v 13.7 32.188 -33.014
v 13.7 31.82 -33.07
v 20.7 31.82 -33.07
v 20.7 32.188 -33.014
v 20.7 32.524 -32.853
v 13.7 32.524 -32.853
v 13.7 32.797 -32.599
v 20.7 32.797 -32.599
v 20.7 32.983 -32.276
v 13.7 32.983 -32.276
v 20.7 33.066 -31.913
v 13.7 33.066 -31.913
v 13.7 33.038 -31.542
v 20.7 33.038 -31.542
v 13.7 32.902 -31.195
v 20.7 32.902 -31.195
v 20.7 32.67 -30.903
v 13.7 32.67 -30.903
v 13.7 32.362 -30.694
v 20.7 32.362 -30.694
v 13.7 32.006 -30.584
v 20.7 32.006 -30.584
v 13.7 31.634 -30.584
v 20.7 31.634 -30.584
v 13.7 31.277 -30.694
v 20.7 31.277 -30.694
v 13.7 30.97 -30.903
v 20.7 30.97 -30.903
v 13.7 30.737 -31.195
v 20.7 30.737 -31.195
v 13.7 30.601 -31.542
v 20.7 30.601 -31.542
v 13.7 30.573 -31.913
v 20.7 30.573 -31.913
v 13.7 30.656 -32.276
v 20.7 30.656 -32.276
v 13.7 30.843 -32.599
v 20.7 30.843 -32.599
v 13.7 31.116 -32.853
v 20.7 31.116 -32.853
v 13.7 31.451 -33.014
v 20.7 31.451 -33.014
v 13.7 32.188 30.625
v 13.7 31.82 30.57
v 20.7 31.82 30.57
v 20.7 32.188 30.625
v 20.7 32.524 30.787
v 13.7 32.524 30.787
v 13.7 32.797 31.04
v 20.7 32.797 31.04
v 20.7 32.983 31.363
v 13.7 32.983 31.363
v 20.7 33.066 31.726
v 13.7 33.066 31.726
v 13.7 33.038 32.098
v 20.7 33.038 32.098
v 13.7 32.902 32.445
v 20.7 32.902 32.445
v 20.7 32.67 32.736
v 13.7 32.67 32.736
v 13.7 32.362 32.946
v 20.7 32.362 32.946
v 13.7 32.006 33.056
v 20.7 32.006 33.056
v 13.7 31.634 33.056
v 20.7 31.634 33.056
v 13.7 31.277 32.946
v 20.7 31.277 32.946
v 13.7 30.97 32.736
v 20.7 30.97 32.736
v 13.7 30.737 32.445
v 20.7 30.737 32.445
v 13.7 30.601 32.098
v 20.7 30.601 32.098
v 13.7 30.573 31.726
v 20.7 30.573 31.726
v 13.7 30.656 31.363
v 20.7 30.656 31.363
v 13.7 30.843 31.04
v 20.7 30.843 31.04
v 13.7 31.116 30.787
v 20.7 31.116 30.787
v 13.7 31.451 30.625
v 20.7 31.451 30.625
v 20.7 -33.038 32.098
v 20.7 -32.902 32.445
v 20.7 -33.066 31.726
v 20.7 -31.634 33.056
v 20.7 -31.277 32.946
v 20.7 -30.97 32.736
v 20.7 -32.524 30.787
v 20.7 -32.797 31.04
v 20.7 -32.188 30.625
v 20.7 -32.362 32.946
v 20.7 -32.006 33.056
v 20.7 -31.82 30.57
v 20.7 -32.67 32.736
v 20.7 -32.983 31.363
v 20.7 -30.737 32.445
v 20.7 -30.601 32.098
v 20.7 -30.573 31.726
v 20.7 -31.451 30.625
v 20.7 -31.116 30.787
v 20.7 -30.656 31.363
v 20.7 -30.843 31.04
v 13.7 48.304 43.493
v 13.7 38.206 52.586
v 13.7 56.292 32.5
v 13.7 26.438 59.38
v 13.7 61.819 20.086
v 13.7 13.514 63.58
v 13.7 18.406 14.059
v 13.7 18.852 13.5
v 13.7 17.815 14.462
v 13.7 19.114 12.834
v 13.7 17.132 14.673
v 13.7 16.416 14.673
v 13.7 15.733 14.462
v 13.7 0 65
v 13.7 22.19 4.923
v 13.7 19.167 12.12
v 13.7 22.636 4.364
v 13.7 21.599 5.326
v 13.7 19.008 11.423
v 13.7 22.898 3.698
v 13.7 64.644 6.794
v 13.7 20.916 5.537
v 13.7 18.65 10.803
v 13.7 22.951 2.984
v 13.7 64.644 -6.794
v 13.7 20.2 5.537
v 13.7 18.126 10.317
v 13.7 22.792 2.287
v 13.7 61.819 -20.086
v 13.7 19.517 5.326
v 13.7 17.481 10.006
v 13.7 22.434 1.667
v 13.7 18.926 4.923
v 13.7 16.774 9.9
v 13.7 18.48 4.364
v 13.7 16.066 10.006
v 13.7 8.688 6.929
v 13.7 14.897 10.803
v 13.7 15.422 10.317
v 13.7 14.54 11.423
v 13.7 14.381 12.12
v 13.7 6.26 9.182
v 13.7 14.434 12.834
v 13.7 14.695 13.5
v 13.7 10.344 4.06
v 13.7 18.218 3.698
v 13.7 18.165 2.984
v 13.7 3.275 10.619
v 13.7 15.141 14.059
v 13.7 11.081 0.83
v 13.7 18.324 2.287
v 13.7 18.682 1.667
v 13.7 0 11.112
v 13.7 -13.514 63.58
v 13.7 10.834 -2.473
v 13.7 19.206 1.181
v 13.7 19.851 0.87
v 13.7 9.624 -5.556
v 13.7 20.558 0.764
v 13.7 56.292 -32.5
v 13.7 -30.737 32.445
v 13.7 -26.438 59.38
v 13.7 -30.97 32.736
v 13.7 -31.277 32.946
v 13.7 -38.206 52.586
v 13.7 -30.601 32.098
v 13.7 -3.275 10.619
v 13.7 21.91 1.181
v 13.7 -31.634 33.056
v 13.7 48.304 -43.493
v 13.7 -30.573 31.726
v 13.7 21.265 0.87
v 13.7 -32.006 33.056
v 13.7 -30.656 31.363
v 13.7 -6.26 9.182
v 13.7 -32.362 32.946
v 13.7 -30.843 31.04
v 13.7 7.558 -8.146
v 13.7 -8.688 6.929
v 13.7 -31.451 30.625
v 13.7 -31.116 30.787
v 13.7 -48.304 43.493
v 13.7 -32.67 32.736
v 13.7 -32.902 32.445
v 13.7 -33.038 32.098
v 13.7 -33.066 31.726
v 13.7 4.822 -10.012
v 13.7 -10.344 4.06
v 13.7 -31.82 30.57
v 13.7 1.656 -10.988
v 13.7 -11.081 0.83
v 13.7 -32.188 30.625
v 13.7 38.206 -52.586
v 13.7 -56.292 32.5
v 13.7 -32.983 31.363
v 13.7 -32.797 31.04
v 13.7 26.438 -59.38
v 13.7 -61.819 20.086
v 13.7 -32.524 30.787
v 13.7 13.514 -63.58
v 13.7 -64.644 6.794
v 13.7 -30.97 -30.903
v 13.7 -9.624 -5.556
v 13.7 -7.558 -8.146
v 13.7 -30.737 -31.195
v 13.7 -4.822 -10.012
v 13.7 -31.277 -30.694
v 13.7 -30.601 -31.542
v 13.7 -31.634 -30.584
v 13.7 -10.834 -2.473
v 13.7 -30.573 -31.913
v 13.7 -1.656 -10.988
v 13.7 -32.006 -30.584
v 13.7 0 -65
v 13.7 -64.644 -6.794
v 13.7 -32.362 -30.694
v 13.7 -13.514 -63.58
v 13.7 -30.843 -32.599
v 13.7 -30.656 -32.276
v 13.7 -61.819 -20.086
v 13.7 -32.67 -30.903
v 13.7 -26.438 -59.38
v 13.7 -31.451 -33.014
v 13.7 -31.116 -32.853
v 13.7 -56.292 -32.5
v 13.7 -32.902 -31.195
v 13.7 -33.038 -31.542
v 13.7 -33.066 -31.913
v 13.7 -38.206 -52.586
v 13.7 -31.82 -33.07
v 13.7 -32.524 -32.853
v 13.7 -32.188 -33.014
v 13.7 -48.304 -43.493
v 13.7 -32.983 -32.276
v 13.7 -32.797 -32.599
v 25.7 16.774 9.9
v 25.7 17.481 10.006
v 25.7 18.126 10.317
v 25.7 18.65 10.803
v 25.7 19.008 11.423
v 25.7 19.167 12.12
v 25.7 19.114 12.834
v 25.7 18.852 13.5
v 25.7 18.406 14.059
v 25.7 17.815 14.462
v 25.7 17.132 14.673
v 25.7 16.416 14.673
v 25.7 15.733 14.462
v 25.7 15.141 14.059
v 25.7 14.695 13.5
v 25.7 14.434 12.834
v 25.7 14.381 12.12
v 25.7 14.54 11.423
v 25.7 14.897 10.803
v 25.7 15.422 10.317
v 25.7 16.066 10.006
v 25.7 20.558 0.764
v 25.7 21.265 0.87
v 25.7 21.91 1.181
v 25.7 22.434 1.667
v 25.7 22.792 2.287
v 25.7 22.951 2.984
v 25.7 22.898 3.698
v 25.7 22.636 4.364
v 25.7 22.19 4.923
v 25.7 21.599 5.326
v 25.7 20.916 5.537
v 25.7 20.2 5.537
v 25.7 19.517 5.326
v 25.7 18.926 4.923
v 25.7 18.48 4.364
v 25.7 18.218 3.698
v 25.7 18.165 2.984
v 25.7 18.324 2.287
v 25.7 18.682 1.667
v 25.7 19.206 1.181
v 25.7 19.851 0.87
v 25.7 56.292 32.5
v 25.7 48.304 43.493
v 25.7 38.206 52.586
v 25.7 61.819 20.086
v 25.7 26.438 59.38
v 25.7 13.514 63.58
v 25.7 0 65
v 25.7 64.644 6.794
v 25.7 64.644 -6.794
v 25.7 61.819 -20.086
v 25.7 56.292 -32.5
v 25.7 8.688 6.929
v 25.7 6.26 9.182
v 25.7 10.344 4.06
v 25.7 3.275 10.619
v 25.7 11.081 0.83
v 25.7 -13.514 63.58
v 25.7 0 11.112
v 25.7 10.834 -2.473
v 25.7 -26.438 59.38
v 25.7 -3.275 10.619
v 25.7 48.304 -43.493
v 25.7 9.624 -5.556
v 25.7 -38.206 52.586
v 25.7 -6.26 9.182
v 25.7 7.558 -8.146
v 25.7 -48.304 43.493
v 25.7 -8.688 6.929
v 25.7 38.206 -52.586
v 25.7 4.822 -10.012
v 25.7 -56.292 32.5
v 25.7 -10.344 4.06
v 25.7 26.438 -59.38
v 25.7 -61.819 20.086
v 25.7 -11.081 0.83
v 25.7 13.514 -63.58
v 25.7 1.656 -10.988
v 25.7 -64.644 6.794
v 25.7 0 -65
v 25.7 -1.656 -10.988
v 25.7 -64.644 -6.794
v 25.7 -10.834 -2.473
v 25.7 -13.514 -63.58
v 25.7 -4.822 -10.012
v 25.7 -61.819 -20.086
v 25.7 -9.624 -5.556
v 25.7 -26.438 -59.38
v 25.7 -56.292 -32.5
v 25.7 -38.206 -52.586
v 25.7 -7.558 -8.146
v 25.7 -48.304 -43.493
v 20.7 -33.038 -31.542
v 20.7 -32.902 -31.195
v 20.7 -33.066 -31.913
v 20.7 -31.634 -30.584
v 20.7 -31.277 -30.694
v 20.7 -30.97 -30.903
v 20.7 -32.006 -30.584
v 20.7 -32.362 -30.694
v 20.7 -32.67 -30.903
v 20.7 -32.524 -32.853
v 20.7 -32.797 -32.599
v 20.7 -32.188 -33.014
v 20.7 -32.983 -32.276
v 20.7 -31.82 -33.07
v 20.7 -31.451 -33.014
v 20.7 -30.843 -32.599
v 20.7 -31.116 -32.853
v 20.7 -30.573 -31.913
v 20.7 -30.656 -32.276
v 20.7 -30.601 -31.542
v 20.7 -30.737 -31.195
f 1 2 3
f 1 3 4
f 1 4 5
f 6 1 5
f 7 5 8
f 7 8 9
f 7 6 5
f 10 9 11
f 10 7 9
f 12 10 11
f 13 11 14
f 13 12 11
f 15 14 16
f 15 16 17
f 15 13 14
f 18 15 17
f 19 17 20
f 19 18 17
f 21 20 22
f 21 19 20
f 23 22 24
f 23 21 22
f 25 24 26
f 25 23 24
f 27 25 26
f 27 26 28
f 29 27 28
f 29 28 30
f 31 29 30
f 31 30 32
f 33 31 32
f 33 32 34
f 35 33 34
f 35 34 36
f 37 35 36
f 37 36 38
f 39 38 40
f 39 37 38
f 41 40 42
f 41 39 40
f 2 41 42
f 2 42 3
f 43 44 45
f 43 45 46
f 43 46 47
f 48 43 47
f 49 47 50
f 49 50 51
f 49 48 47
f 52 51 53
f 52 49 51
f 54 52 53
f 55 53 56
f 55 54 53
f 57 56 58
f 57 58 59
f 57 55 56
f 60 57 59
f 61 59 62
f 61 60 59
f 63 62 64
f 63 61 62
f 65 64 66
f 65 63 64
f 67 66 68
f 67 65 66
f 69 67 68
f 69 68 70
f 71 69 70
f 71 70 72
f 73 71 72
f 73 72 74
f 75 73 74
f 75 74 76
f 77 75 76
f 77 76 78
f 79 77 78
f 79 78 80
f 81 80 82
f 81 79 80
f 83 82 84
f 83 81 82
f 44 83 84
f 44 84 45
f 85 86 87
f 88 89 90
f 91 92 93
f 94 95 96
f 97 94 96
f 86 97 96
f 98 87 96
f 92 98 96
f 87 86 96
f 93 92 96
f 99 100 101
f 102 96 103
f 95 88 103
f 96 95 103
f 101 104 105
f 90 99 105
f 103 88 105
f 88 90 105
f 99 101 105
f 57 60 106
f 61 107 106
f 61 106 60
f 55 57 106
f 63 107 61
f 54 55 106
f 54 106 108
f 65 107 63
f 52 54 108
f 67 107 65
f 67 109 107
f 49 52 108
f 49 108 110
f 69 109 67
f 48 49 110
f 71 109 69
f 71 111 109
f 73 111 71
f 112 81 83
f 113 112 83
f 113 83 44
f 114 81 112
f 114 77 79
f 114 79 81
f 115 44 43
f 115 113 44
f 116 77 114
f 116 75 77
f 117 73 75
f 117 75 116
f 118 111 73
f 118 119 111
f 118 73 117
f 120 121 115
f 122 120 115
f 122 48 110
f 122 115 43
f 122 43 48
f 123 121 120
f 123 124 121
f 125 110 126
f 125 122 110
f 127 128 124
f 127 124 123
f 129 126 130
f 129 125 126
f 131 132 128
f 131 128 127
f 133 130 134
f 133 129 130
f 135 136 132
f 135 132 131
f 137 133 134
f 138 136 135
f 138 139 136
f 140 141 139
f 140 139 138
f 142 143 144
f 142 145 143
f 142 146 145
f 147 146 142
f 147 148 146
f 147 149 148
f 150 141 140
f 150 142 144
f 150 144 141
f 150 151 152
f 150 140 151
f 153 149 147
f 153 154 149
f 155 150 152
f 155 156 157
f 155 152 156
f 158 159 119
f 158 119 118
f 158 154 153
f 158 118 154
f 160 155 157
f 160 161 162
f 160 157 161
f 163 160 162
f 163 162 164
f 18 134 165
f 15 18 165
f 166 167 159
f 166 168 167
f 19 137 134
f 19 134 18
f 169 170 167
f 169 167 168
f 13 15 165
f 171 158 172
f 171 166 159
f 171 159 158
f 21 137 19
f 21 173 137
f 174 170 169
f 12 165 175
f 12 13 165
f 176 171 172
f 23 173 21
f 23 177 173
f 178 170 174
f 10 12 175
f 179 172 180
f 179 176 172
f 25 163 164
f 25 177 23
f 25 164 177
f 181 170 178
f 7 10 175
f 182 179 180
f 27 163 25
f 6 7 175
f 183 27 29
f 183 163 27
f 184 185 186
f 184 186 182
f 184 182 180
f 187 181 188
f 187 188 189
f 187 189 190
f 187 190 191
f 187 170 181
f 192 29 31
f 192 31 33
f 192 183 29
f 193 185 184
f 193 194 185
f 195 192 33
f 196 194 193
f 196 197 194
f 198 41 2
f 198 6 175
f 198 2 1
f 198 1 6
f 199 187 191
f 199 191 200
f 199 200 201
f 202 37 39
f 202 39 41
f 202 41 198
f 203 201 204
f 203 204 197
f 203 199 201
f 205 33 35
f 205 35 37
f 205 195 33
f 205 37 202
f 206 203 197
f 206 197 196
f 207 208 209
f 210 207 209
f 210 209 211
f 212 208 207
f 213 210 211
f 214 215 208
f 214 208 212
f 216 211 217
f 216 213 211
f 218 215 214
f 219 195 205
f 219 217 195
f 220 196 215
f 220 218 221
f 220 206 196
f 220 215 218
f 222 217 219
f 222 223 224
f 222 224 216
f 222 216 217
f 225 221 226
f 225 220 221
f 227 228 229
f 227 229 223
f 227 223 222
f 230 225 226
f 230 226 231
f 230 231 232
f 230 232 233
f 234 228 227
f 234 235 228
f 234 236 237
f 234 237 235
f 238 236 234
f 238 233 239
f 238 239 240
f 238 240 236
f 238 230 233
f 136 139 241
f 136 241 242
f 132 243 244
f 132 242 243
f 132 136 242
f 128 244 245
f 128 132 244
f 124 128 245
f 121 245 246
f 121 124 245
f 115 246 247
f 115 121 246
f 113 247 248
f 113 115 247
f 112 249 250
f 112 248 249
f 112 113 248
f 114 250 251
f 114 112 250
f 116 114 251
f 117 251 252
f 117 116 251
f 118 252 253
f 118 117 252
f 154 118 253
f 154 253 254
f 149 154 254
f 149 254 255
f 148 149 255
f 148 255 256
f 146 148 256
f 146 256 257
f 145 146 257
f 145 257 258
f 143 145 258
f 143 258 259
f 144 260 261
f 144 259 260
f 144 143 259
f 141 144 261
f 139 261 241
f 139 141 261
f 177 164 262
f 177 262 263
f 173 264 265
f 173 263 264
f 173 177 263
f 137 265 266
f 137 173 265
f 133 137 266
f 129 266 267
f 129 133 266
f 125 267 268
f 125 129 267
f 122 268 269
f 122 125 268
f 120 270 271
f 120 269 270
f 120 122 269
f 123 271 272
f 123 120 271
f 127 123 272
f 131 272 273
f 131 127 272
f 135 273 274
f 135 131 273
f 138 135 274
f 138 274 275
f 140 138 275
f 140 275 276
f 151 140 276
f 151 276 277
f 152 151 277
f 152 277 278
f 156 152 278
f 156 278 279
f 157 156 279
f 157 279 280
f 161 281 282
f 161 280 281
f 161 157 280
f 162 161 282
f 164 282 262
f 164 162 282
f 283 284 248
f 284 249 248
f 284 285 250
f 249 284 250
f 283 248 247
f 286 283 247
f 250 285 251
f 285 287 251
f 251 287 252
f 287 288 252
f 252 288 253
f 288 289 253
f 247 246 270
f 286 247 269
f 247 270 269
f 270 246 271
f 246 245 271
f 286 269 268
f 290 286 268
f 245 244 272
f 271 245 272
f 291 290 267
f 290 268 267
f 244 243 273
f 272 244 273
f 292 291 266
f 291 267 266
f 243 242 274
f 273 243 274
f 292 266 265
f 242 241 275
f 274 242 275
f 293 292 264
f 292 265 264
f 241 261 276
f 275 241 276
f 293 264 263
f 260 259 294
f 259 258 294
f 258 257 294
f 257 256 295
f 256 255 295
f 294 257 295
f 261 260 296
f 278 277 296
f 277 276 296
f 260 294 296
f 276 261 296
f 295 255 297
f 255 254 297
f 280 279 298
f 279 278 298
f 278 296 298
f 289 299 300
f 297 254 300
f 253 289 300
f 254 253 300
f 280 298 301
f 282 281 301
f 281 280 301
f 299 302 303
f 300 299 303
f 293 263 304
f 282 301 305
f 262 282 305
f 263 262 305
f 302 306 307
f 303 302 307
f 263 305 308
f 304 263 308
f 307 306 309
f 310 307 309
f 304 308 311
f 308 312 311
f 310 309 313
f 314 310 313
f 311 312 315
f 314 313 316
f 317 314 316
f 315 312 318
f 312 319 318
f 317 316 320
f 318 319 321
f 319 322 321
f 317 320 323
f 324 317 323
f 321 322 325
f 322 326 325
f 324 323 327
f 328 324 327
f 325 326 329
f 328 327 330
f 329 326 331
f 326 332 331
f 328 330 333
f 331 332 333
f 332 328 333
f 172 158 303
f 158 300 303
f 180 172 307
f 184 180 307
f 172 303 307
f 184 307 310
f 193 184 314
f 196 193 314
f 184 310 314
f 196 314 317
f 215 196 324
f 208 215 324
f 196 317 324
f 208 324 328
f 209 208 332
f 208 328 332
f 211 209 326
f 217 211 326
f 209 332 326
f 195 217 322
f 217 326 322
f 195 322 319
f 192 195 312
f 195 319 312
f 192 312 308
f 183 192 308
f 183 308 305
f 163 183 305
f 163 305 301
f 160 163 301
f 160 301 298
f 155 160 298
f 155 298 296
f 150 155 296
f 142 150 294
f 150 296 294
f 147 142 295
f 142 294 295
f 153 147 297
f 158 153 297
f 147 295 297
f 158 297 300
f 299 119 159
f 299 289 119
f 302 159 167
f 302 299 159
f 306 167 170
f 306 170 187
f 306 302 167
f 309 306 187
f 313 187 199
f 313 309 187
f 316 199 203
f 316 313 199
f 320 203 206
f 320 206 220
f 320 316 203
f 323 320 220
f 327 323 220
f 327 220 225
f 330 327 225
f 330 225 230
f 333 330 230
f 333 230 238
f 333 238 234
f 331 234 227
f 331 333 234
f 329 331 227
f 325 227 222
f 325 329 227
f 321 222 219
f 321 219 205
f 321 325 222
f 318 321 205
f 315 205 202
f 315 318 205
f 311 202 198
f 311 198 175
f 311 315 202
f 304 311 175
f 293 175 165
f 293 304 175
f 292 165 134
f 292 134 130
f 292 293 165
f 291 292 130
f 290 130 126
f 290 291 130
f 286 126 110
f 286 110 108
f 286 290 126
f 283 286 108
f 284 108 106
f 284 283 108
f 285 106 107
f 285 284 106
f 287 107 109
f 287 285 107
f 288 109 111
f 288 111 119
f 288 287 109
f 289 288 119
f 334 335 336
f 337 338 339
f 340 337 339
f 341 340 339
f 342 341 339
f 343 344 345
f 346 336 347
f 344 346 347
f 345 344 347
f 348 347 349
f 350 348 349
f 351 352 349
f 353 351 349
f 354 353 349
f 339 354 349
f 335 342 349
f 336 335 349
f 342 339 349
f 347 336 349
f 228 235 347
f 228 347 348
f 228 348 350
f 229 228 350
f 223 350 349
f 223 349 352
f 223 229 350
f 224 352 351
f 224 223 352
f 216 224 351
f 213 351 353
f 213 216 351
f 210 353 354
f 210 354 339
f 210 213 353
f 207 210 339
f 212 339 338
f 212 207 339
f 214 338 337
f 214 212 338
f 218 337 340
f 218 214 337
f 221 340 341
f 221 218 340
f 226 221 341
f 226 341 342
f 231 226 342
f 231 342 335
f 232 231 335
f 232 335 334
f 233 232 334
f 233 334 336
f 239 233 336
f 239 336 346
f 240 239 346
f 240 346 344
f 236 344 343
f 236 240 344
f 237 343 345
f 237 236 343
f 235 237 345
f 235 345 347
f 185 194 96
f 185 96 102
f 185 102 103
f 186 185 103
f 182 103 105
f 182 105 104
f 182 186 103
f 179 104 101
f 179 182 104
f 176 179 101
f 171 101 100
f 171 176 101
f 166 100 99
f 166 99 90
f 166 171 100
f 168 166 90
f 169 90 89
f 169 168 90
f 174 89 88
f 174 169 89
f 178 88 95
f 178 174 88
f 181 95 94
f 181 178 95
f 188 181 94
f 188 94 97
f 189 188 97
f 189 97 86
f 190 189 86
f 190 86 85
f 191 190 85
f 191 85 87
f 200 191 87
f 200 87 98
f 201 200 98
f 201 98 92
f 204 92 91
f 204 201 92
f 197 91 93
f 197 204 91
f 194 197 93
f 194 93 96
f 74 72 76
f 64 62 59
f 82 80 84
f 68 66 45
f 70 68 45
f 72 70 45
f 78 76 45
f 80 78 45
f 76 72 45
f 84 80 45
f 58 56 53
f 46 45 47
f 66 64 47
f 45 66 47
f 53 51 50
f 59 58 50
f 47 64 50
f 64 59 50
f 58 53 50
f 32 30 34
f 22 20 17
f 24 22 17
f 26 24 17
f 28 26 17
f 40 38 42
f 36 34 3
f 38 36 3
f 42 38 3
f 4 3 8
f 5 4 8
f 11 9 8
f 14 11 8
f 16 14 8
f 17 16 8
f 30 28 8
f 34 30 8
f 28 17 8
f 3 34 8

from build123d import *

# Parameters (mm, degrees)
AXIAL_PROFILE_MM_W     = 12
AXIAL_PROFILE_MM_H     = 53.8875
AXIAL_HOLES_DEPTH      = 96.448886845
AXIAL_HOLES_DEPTH_BACK = 96.448886845
SKETCH2_R              = 2.4
CUT_EXTRUDE2_START     = 13.7
SKETCH3_R              = 1.25
CUT_EXTRUDE2_DEPTH     = 7


with BuildPart() as part:
    # Axial profile (mm) → Full revolution (revolve)
    with BuildSketch(Plane.XY, mode=Mode.PRIVATE) as full_revolution_sk:
        with Locations((19.7, 38.05625)):
            Rectangle(AXIAL_PROFILE_MM_W, AXIAL_PROFILE_MM_H)
    revolve(full_revolution_sk.sketch.rotate(Axis((-110, 0, 0), (1, 0, 0)), 90), axis=Axis((-110, 0, 0), (1, 0, 0)))

    # Sketch2 → Axial holes (cut, two sides: drawn at the far end of the back side and taken through both)
    with BuildSketch(Plane(origin=(0, 0, 0), x_dir=(0, 0, -1), z_dir=(1, 0, 0)).offset(-AXIAL_HOLES_DEPTH_BACK)):
        with Locations((-3.163812264, 20.557973926)):
            Circle(SKETCH2_R)
        with Locations((-12.299529665, 16.773835877)):
            Circle(SKETCH2_R)
    extrude(amount=AXIAL_HOLES_DEPTH + AXIAL_HOLES_DEPTH_BACK, mode=Mode.SUBTRACT)

    # Sketch3 → Cut-Extrude2 (cut)
    with BuildSketch(Plane(origin=(0, 0, 0), x_dir=(0, 0, -1), z_dir=(1, 0, 0)).offset(CUT_EXTRUDE2_START)):
        with Locations((-31.819805153, 31.819805153)):
            Circle(SKETCH3_R)
        with Locations((-31.819805153, -31.819805153)):
            Circle(SKETCH3_R)
        with Locations((31.819805153, -31.819805153)):
            Circle(SKETCH3_R)
        with Locations((31.819805153, 31.819805153)):
            Circle(SKETCH3_R)
    extrude(amount=CUT_EXTRUDE2_DEPTH, mode=Mode.SUBTRACT)


solid = part.part
